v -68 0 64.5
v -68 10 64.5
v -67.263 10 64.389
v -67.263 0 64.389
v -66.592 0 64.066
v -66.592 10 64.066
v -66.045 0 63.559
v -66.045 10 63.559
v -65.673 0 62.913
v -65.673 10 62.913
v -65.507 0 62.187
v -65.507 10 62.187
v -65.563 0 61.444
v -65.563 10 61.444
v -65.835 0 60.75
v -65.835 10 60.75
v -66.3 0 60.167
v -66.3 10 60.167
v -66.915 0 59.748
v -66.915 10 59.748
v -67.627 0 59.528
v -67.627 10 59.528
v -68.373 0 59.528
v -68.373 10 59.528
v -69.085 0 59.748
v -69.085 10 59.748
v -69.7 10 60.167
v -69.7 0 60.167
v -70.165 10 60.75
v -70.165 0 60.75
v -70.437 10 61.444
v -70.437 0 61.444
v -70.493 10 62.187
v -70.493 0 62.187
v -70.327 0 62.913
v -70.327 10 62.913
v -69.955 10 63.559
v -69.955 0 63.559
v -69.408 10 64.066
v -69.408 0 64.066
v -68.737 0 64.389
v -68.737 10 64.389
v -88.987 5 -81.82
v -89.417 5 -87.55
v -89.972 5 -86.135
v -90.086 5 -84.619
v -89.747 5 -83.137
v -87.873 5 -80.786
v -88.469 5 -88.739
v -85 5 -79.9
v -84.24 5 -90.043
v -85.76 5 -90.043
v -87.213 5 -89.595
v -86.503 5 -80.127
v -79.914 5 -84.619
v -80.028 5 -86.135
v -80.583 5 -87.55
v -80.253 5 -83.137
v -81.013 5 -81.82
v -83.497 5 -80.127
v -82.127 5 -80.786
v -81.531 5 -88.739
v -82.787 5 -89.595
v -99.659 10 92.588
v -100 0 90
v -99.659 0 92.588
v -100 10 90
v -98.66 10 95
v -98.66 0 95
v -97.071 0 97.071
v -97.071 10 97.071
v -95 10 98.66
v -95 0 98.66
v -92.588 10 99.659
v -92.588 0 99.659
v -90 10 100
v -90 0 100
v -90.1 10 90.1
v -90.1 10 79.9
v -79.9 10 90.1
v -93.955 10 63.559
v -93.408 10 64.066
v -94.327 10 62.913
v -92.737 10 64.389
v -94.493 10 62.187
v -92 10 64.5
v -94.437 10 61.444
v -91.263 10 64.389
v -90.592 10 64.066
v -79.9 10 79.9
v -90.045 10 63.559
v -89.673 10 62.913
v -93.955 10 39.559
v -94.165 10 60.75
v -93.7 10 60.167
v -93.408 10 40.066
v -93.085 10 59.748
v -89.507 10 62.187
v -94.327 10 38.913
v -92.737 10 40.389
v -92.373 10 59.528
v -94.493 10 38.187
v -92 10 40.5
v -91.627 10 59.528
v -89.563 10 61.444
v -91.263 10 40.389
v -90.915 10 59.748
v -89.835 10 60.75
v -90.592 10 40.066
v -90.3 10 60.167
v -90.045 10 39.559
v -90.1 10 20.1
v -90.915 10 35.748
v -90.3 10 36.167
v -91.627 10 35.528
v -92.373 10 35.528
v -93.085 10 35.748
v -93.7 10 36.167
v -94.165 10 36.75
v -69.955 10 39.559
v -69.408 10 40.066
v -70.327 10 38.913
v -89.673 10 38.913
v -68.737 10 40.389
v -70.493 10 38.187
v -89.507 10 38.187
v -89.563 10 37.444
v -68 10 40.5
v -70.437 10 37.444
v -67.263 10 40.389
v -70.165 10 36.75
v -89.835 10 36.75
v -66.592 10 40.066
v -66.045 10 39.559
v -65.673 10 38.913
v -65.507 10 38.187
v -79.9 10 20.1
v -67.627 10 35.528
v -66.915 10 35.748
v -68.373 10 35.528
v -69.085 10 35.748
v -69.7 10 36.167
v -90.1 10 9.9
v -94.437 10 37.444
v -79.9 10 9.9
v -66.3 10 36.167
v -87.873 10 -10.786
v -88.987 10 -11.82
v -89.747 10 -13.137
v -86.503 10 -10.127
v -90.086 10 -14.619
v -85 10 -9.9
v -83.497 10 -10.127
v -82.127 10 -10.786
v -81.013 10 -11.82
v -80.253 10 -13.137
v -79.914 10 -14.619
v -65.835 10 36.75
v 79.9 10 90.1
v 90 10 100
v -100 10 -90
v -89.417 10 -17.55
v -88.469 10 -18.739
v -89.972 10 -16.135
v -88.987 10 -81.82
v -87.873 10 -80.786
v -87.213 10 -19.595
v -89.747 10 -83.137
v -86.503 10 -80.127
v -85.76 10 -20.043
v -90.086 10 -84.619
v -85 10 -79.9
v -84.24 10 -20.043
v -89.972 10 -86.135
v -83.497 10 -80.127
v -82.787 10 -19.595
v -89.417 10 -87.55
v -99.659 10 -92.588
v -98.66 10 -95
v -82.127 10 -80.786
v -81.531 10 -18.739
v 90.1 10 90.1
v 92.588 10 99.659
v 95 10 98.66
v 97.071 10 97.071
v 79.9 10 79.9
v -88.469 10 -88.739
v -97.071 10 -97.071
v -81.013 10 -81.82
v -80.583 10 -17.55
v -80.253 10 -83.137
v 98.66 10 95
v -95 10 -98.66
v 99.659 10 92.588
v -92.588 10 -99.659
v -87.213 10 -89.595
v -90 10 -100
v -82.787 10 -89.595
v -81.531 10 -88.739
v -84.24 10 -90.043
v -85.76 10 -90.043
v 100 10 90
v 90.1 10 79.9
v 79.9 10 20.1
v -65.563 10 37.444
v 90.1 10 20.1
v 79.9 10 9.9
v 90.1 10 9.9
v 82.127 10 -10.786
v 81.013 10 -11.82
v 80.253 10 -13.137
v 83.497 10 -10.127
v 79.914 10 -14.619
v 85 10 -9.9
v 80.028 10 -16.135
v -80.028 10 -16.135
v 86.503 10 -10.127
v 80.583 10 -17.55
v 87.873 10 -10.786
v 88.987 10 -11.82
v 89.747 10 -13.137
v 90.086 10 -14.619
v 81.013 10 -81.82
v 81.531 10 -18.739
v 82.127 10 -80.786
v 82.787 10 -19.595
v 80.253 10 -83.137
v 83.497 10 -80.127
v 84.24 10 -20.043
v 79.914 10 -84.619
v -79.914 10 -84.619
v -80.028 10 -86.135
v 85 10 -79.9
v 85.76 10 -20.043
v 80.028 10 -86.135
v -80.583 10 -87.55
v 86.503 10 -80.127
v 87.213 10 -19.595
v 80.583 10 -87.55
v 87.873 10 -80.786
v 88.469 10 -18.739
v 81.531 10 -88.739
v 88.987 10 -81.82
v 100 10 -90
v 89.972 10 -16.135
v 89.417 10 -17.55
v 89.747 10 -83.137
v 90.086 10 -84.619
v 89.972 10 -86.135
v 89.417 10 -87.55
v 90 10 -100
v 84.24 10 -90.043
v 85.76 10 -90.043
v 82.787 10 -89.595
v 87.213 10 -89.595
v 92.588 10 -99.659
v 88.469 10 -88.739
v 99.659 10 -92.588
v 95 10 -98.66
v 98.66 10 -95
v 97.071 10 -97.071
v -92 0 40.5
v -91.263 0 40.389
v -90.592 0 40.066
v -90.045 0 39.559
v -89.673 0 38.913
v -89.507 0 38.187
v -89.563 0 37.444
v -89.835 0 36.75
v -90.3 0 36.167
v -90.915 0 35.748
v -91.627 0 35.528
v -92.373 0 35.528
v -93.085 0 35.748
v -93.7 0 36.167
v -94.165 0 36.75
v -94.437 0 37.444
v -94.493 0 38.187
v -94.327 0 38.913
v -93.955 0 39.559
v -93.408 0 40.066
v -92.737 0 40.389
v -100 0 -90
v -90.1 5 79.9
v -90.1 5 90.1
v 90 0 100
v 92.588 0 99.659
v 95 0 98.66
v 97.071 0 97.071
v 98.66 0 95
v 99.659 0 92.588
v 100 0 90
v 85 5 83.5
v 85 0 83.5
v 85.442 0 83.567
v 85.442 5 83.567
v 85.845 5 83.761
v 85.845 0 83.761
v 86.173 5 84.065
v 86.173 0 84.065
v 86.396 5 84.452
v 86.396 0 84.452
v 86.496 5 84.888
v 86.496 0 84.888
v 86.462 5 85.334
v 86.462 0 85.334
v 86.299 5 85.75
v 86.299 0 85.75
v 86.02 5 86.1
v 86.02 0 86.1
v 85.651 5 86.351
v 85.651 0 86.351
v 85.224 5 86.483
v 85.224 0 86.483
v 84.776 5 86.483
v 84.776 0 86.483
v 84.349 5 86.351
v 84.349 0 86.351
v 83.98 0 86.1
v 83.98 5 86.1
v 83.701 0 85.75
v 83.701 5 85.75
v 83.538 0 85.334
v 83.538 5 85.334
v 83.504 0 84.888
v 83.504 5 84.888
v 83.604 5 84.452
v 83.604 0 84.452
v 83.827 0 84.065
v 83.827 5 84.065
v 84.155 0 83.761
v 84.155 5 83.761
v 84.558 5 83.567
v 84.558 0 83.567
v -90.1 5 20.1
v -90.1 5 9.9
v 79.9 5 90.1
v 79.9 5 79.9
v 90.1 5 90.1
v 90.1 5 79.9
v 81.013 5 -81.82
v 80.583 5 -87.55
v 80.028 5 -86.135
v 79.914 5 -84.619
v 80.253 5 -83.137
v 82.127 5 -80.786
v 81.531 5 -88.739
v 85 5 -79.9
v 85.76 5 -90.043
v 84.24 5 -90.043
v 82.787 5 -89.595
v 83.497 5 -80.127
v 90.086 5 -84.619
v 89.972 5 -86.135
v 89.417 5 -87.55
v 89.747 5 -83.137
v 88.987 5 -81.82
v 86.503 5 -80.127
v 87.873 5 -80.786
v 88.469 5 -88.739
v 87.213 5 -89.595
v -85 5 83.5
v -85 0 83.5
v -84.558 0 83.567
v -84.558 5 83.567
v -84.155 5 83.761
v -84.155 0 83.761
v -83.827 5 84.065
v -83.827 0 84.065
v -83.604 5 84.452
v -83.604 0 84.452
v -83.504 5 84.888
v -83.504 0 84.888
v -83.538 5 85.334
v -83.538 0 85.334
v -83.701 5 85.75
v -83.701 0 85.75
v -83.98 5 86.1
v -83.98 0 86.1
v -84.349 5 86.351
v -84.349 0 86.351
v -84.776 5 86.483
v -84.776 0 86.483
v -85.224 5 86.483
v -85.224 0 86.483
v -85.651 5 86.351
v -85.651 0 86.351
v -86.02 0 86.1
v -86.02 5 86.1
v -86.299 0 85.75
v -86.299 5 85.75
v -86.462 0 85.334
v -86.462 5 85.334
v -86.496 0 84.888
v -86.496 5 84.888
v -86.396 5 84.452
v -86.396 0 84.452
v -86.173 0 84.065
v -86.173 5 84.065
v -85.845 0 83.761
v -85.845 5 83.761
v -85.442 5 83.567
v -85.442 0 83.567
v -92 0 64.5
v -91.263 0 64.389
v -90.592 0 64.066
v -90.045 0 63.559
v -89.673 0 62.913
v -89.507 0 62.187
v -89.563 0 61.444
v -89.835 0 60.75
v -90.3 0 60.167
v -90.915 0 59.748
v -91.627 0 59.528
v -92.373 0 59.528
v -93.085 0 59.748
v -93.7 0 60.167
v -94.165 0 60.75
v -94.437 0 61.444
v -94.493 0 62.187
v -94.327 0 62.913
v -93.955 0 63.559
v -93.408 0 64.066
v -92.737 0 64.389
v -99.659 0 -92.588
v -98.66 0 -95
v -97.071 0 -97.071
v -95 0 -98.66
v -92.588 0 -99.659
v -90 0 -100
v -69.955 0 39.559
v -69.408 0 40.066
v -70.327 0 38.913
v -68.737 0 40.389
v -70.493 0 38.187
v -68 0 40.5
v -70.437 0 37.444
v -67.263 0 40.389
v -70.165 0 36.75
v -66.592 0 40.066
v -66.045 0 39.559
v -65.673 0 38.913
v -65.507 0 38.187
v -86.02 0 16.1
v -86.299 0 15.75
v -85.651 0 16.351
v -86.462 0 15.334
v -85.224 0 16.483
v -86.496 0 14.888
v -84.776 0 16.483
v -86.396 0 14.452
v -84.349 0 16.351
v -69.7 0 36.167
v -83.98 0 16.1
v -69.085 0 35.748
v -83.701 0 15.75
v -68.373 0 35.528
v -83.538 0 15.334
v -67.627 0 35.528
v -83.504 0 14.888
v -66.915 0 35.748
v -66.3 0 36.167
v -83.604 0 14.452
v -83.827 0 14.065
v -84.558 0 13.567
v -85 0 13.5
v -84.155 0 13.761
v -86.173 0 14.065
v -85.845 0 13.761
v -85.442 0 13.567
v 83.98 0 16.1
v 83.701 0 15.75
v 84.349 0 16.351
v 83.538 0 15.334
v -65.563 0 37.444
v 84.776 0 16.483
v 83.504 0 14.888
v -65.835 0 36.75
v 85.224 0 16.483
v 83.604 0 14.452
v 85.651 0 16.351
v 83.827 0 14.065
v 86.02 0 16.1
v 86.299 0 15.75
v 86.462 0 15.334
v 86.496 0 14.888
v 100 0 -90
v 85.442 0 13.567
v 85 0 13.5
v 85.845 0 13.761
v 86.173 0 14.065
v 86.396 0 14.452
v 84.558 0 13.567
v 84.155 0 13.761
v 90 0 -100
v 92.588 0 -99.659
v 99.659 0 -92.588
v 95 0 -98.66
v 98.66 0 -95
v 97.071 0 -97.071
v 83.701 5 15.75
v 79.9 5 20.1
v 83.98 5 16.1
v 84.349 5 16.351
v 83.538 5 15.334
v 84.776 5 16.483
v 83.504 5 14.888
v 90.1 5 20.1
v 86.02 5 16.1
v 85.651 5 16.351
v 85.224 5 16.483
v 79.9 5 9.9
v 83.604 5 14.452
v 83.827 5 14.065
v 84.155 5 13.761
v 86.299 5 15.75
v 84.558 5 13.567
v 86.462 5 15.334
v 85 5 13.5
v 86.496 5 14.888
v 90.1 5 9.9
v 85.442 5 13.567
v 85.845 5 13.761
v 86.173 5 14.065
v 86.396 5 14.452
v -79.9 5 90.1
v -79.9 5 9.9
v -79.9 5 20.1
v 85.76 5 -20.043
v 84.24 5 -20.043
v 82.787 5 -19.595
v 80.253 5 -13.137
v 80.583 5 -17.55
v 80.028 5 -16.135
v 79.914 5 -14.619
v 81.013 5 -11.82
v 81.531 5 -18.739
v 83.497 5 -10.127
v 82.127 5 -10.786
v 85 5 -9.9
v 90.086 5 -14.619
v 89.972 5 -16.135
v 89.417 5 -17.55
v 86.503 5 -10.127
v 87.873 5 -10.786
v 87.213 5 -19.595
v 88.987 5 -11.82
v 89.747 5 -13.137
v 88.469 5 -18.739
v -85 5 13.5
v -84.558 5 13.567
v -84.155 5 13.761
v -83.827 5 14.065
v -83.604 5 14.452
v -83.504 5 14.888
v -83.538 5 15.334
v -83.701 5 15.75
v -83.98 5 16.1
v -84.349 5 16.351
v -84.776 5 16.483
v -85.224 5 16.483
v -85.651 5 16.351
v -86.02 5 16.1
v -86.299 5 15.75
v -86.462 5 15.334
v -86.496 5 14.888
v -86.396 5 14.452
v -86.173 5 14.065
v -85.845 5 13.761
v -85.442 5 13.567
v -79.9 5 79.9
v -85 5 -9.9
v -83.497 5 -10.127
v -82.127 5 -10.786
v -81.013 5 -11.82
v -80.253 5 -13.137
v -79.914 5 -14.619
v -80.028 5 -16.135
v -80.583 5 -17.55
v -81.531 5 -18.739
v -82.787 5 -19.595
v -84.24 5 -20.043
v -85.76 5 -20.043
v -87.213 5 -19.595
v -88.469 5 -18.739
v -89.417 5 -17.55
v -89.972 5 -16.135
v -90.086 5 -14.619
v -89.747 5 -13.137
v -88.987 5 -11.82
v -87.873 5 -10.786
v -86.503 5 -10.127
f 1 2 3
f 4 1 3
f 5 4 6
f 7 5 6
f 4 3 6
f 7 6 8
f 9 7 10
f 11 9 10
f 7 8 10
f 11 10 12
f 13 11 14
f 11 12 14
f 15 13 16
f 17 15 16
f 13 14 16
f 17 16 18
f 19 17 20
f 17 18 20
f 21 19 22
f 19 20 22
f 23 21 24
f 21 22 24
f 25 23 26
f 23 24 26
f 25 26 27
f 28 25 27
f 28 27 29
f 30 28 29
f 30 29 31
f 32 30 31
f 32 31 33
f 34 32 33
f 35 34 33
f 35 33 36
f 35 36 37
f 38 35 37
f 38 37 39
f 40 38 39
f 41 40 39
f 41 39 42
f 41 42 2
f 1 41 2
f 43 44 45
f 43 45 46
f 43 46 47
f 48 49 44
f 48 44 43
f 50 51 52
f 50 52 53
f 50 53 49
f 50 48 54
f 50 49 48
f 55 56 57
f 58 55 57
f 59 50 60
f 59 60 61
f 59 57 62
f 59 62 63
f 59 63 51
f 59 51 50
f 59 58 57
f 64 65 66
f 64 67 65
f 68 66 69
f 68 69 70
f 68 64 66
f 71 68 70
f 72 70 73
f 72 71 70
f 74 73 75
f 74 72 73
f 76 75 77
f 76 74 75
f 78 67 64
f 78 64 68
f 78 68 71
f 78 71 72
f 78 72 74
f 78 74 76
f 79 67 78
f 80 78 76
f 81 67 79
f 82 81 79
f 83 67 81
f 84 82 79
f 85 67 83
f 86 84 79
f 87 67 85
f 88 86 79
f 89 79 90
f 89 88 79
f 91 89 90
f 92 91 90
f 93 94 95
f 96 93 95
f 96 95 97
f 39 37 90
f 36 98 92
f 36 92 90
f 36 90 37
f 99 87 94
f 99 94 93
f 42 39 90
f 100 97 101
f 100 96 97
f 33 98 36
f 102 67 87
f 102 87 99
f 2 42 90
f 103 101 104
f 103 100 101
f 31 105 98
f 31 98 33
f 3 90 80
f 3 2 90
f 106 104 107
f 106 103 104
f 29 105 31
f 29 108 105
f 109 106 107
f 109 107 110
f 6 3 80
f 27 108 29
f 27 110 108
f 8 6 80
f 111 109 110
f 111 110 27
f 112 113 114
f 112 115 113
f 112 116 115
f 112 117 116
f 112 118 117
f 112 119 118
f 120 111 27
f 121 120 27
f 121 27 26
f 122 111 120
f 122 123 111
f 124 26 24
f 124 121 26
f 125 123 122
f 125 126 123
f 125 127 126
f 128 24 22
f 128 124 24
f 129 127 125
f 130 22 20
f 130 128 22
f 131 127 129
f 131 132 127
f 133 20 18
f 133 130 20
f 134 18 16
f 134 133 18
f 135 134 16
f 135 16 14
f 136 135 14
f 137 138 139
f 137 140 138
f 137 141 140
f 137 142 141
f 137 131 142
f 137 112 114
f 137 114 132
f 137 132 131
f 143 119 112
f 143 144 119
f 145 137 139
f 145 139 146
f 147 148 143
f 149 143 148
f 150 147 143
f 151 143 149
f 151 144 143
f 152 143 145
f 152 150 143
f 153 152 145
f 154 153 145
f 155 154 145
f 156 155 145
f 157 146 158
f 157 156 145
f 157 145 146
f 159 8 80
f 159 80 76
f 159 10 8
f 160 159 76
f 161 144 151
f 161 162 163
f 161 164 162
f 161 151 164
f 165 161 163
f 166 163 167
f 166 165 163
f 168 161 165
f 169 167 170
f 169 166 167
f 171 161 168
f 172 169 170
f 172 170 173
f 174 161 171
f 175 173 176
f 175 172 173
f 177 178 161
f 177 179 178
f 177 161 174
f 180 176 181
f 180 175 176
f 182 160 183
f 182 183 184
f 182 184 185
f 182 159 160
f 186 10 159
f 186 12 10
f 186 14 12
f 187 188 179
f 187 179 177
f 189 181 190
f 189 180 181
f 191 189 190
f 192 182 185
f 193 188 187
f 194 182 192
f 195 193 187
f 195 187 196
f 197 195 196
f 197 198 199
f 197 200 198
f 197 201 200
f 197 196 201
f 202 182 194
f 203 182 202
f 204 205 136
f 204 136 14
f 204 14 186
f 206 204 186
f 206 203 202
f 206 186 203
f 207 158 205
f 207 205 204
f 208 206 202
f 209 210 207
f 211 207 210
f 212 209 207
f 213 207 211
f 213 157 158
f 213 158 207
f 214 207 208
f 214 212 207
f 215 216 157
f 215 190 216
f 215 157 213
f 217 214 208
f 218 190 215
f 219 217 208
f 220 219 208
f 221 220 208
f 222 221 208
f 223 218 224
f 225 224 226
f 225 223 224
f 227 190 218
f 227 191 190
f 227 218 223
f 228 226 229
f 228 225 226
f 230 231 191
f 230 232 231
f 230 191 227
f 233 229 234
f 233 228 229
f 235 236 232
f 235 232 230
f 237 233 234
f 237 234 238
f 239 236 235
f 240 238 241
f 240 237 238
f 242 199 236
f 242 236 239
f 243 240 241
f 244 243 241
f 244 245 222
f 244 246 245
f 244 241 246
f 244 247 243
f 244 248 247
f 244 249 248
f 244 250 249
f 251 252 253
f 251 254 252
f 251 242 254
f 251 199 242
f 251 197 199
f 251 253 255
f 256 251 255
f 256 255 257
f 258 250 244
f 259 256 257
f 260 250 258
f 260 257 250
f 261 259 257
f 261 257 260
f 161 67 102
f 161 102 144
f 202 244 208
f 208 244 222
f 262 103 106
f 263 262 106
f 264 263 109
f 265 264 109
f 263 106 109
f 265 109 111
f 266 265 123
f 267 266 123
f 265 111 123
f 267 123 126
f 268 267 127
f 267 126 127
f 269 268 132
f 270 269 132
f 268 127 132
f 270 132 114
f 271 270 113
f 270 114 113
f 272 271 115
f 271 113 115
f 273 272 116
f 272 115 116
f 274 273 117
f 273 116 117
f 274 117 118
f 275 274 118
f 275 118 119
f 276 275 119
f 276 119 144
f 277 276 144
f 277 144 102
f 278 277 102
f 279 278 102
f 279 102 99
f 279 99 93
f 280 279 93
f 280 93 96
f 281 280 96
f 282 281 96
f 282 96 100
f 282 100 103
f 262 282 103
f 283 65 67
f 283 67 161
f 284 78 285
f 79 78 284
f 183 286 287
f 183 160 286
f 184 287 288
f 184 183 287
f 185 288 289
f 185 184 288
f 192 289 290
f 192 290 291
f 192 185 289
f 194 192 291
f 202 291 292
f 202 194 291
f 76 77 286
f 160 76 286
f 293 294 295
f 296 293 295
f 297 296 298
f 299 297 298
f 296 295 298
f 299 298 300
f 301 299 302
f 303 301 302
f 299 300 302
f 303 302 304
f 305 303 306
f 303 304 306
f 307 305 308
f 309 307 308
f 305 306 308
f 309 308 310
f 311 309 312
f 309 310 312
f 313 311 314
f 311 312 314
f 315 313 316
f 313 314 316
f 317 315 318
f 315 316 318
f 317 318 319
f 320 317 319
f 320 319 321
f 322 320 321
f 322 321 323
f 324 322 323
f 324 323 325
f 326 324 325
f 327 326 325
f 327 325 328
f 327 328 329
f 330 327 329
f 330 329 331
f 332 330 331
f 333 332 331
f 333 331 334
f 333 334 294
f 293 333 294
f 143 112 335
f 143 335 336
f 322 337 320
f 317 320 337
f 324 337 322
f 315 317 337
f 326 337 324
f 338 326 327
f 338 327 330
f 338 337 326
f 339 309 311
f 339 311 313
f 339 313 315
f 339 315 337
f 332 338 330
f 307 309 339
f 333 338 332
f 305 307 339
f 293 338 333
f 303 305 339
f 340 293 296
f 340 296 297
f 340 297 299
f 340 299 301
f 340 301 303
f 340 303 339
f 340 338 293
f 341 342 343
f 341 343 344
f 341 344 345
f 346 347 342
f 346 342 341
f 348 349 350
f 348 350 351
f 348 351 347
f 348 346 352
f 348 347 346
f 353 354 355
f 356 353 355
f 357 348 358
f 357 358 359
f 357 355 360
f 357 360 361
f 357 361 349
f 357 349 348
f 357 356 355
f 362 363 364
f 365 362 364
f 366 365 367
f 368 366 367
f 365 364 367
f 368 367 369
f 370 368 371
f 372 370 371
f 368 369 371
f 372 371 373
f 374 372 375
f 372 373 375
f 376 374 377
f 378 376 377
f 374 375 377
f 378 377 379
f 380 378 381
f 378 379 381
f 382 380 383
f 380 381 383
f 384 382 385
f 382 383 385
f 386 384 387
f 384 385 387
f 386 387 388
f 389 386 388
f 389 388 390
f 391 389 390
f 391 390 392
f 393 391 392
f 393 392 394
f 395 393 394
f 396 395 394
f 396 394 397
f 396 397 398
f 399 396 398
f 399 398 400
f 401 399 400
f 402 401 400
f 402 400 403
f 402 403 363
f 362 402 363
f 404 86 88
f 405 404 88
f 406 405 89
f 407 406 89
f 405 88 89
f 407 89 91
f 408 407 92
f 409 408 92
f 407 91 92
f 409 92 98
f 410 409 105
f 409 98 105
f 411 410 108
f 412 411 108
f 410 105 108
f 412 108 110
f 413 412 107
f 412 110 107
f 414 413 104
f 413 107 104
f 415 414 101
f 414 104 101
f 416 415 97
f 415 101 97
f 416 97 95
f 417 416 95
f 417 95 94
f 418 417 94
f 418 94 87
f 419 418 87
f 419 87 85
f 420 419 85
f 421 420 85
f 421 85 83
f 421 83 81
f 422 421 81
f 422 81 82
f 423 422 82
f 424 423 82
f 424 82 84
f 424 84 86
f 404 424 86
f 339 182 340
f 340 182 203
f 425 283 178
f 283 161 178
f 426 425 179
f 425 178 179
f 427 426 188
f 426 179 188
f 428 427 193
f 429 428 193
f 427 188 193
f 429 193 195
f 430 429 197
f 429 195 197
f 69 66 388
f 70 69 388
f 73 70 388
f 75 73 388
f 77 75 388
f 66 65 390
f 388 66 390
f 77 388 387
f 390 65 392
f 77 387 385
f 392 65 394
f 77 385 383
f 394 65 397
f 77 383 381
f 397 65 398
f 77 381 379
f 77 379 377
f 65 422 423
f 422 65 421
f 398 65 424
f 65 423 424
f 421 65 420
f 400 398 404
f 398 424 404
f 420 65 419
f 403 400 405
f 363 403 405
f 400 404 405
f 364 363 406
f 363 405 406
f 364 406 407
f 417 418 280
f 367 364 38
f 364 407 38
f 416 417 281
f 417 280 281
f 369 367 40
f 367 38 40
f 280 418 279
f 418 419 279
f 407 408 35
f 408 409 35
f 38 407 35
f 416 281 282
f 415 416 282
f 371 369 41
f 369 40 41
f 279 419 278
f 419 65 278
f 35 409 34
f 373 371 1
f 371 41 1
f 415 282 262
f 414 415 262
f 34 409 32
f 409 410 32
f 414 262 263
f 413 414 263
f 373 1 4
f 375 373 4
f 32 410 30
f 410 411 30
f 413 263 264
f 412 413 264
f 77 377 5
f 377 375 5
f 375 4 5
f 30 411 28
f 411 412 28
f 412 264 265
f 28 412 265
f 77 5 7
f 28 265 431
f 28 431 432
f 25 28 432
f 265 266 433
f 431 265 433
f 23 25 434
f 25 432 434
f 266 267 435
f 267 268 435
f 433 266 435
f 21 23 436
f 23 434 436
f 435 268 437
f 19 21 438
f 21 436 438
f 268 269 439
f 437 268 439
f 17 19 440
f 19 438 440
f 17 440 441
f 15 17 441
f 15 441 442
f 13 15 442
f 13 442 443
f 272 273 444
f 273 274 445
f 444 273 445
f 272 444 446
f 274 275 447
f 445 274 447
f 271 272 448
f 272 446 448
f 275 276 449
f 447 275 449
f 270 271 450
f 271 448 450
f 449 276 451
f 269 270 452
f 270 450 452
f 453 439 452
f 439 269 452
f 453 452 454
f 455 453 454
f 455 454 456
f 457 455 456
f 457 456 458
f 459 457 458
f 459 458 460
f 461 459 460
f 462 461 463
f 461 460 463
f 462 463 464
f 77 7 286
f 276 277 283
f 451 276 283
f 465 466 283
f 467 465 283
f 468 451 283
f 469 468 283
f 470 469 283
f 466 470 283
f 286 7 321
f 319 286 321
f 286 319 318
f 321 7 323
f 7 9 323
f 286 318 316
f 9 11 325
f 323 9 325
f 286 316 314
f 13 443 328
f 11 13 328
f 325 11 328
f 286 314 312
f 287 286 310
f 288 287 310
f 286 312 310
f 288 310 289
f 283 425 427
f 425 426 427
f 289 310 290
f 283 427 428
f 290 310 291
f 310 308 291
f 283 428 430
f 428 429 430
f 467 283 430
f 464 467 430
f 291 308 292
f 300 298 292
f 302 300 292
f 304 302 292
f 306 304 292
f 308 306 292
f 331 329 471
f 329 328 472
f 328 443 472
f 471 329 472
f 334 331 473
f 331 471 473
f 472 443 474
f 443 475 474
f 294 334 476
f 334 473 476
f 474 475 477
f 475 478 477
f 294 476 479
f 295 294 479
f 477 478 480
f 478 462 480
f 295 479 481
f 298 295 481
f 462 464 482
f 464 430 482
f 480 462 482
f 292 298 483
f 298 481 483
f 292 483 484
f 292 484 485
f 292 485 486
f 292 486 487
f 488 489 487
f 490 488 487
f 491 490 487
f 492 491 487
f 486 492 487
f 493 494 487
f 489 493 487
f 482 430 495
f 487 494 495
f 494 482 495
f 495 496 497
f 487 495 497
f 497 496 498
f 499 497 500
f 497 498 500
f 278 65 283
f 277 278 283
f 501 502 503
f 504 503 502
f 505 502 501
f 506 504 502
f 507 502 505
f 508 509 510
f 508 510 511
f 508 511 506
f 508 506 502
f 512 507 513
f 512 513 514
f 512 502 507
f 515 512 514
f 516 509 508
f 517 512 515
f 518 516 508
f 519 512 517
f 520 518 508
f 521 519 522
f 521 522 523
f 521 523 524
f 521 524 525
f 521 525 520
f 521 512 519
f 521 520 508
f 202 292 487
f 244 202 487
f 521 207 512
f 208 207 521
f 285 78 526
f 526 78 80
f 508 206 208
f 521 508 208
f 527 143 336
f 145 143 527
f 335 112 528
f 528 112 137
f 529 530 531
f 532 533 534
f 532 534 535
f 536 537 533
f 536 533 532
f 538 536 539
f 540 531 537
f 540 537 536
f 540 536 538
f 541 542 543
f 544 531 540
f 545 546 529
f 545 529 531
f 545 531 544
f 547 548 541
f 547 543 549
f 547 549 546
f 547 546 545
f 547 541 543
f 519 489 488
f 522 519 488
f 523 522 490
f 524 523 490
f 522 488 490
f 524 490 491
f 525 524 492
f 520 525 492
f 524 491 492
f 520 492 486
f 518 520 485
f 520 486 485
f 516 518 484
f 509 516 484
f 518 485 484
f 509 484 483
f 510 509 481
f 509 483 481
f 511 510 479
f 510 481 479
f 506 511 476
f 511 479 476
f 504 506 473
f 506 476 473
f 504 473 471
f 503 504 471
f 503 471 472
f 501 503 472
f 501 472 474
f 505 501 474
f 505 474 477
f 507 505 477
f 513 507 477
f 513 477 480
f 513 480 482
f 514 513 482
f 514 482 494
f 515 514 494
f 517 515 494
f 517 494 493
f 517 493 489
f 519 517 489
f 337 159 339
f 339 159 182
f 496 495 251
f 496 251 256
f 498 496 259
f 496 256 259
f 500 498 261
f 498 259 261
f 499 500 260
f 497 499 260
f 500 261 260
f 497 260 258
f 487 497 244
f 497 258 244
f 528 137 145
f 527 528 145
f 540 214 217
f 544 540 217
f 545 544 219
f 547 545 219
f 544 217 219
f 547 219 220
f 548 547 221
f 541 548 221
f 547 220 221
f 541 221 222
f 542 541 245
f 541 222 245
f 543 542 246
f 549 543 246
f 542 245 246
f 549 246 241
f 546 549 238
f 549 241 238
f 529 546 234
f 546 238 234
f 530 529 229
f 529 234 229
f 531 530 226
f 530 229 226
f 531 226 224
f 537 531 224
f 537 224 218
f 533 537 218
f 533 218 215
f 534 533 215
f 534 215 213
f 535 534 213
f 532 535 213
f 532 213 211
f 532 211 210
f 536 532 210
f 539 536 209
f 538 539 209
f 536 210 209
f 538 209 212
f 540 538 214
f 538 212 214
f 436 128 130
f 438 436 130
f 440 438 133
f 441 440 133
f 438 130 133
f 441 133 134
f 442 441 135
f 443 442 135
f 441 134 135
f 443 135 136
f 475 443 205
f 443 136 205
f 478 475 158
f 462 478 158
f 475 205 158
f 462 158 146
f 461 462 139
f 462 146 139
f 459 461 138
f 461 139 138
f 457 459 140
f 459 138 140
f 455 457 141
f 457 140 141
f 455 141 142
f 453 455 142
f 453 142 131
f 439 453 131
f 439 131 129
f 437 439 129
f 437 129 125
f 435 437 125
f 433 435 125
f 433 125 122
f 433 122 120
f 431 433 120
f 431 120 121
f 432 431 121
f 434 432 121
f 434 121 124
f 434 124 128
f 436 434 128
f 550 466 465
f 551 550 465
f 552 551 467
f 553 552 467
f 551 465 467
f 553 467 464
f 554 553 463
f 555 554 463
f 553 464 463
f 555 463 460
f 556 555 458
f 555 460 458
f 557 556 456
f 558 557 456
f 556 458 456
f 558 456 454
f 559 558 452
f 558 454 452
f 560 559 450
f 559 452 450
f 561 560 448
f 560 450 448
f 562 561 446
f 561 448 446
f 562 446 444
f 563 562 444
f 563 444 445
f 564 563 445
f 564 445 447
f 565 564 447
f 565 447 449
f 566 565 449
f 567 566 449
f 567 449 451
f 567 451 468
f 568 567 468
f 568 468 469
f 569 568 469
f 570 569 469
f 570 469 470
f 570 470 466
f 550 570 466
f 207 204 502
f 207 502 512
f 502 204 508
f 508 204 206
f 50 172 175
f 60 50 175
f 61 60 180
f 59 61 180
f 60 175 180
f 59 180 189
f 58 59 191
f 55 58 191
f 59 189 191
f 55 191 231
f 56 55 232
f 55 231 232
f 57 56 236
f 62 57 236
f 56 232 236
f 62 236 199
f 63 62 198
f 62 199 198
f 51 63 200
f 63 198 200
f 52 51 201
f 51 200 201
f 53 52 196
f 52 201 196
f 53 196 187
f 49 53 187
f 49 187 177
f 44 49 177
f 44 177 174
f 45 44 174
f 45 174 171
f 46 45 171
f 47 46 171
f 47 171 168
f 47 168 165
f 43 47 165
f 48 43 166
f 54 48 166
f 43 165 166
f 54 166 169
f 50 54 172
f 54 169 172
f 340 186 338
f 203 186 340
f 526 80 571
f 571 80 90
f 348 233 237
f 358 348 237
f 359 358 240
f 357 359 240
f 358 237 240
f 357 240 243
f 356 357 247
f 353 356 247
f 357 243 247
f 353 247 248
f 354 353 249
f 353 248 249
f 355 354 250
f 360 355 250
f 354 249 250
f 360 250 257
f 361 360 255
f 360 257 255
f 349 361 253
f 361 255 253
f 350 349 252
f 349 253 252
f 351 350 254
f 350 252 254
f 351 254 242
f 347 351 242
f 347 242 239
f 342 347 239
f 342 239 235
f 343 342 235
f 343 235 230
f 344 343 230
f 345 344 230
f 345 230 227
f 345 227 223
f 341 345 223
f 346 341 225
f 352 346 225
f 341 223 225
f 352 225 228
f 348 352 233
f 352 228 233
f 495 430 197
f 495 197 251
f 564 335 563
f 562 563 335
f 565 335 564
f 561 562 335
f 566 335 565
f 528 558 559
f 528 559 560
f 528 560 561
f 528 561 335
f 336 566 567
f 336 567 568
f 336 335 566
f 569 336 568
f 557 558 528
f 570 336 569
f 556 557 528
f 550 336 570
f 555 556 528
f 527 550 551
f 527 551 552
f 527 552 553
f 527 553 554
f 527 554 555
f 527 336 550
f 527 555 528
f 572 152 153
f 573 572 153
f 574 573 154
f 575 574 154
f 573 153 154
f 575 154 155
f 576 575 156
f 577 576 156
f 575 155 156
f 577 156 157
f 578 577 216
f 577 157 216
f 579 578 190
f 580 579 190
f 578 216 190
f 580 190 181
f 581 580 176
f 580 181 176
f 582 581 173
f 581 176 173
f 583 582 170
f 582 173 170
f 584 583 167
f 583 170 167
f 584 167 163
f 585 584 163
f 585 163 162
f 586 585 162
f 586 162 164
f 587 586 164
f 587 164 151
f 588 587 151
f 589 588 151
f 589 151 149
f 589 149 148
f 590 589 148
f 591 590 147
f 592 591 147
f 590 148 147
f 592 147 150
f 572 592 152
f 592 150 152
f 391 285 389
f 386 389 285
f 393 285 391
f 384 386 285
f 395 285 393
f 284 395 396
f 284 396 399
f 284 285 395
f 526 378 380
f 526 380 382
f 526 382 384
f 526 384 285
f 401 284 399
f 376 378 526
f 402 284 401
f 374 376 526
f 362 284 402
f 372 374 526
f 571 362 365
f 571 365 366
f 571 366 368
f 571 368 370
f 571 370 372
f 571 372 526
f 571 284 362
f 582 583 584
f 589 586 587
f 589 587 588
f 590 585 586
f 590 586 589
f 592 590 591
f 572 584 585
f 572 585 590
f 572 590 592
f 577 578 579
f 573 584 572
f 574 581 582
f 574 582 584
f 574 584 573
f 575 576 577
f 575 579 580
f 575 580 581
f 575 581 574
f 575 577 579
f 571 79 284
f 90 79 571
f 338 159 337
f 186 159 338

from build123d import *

# Parameters (mm, degrees)
SKETCH_1_W          = 200
SKETCH_1_H          = 200
EXTRUDE_1_DEPTH     = 10
SKETCH_2_W          = 10.2
SKETCH_2_H          = 10.2
CUT_EXTRUDE_3_DEPTH = 5
FILLET_1_R          = 10
SKETCH_3_R          = 5.1
CUT_EXTRUDE_1_DEPTH = 5
SKETCH_4_R          = 2.5
CUT_EXTRUDE_2_DEPTH = 142.774468788
SKETCH_5_R          = 1.5
CUT_EXTRUDE_4_DEPTH = 142.774468788


with BuildPart() as part:
    # ｽｹｯﾁ1 → ﾎﾞｽ - 押し出し1 (new body)
    with BuildSketch(Plane(origin=(0, 0, 0), x_dir=(1, 0, 0), z_dir=(0, 1, 0))):
        Rectangle(SKETCH_1_W, SKETCH_1_H)
    extrude(amount=EXTRUDE_1_DEPTH)

    # ｽｹｯﾁ2 → ｶｯﾄ - 押し出し3 (cut)
    with BuildSketch(Plane(origin=(0, 10, 0), x_dir=(1, 0, 0), z_dir=(0, 1, 0))):
        with Locations((-85, -15)):
            Rectangle(SKETCH_2_W, SKETCH_2_H)
        with Locations((85, -15)):
            Rectangle(SKETCH_2_W, SKETCH_2_H)
        with Locations((-85, -85)):
            Rectangle(SKETCH_2_W, SKETCH_2_H)
        with Locations((85, -85)):
            Rectangle(SKETCH_2_W, SKETCH_2_H)
    extrude(amount=-CUT_EXTRUDE_3_DEPTH, mode=Mode.SUBTRACT)

    # ﾌｨﾚｯﾄ1
    fillet_1_edges = [part.edges().sort_by_distance(p)[0] for p in [
        (100, 5, 100),
        (-100, 5, 100),
        (-100, 5, -100),
        (100, 5, -100),
    ]]
    fillet(fillet_1_edges, radius=FILLET_1_R)

    # ｽｹｯﾁ3 → ｶｯﾄ - 押し出し1 (cut)
    with BuildSketch(Plane(origin=(0, 10, 0), x_dir=(1, 0, 0), z_dir=(0, 1, 0))):
        with Locations(Location((-85, 85, 0), (0, 0, 270))):
            Circle(SKETCH_3_R)
        with Locations(Location((85, 85, 0), (0, 0, 270))):
            Circle(SKETCH_3_R)
        with Locations(Location((-85, 15, 0), (0, 0, 270))):
            Circle(SKETCH_3_R)
        with Locations(Location((85, 15, 0), (0, 0, 270))):
            Circle(SKETCH_3_R)
    extrude(amount=-CUT_EXTRUDE_1_DEPTH, mode=Mode.SUBTRACT)

    # ｽｹｯﾁ4 → ｶｯﾄ - 押し出し2 (cut, through all)
    with BuildSketch(Plane(origin=(0, 10, 0), x_dir=(1, 0, 0), z_dir=(0, 1, 0))):
        with Locations(Location((-68, -38, 0), (0, 0, 270))):
            Circle(SKETCH_4_R)
        with Locations(Location((-68, -62, 0), (0, 0, 270))):
            Circle(SKETCH_4_R)
        with Locations(Location((-92, -62, 0), (0, 0, 270))):
            Circle(SKETCH_4_R)
        with Locations(Location((-92, -38, 0), (0, 0, 270))):
            Circle(SKETCH_4_R)
    extrude(amount=-CUT_EXTRUDE_2_DEPTH, mode=Mode.SUBTRACT)

    # ｽｹｯﾁ5 → ｶｯﾄ - 押し出し4 (cut, through all)
    with BuildSketch(Plane.XZ):
        with Locations(Location((-85, 85, 0), (0, 0, 270))):
            Circle(SKETCH_5_R)
        with Locations(Location((85, 85, 0), (0, 0, 270))):
            Circle(SKETCH_5_R)
        with Locations(Location((-85, 15, 0), (0, 0, 270))):
            Circle(SKETCH_5_R)
        with Locations(Location((85, 15, 0), (0, 0, 270))):
            Circle(SKETCH_5_R)
    extrude(amount=-CUT_EXTRUDE_4_DEPTH, mode=Mode.SUBTRACT)


solid = part.part
